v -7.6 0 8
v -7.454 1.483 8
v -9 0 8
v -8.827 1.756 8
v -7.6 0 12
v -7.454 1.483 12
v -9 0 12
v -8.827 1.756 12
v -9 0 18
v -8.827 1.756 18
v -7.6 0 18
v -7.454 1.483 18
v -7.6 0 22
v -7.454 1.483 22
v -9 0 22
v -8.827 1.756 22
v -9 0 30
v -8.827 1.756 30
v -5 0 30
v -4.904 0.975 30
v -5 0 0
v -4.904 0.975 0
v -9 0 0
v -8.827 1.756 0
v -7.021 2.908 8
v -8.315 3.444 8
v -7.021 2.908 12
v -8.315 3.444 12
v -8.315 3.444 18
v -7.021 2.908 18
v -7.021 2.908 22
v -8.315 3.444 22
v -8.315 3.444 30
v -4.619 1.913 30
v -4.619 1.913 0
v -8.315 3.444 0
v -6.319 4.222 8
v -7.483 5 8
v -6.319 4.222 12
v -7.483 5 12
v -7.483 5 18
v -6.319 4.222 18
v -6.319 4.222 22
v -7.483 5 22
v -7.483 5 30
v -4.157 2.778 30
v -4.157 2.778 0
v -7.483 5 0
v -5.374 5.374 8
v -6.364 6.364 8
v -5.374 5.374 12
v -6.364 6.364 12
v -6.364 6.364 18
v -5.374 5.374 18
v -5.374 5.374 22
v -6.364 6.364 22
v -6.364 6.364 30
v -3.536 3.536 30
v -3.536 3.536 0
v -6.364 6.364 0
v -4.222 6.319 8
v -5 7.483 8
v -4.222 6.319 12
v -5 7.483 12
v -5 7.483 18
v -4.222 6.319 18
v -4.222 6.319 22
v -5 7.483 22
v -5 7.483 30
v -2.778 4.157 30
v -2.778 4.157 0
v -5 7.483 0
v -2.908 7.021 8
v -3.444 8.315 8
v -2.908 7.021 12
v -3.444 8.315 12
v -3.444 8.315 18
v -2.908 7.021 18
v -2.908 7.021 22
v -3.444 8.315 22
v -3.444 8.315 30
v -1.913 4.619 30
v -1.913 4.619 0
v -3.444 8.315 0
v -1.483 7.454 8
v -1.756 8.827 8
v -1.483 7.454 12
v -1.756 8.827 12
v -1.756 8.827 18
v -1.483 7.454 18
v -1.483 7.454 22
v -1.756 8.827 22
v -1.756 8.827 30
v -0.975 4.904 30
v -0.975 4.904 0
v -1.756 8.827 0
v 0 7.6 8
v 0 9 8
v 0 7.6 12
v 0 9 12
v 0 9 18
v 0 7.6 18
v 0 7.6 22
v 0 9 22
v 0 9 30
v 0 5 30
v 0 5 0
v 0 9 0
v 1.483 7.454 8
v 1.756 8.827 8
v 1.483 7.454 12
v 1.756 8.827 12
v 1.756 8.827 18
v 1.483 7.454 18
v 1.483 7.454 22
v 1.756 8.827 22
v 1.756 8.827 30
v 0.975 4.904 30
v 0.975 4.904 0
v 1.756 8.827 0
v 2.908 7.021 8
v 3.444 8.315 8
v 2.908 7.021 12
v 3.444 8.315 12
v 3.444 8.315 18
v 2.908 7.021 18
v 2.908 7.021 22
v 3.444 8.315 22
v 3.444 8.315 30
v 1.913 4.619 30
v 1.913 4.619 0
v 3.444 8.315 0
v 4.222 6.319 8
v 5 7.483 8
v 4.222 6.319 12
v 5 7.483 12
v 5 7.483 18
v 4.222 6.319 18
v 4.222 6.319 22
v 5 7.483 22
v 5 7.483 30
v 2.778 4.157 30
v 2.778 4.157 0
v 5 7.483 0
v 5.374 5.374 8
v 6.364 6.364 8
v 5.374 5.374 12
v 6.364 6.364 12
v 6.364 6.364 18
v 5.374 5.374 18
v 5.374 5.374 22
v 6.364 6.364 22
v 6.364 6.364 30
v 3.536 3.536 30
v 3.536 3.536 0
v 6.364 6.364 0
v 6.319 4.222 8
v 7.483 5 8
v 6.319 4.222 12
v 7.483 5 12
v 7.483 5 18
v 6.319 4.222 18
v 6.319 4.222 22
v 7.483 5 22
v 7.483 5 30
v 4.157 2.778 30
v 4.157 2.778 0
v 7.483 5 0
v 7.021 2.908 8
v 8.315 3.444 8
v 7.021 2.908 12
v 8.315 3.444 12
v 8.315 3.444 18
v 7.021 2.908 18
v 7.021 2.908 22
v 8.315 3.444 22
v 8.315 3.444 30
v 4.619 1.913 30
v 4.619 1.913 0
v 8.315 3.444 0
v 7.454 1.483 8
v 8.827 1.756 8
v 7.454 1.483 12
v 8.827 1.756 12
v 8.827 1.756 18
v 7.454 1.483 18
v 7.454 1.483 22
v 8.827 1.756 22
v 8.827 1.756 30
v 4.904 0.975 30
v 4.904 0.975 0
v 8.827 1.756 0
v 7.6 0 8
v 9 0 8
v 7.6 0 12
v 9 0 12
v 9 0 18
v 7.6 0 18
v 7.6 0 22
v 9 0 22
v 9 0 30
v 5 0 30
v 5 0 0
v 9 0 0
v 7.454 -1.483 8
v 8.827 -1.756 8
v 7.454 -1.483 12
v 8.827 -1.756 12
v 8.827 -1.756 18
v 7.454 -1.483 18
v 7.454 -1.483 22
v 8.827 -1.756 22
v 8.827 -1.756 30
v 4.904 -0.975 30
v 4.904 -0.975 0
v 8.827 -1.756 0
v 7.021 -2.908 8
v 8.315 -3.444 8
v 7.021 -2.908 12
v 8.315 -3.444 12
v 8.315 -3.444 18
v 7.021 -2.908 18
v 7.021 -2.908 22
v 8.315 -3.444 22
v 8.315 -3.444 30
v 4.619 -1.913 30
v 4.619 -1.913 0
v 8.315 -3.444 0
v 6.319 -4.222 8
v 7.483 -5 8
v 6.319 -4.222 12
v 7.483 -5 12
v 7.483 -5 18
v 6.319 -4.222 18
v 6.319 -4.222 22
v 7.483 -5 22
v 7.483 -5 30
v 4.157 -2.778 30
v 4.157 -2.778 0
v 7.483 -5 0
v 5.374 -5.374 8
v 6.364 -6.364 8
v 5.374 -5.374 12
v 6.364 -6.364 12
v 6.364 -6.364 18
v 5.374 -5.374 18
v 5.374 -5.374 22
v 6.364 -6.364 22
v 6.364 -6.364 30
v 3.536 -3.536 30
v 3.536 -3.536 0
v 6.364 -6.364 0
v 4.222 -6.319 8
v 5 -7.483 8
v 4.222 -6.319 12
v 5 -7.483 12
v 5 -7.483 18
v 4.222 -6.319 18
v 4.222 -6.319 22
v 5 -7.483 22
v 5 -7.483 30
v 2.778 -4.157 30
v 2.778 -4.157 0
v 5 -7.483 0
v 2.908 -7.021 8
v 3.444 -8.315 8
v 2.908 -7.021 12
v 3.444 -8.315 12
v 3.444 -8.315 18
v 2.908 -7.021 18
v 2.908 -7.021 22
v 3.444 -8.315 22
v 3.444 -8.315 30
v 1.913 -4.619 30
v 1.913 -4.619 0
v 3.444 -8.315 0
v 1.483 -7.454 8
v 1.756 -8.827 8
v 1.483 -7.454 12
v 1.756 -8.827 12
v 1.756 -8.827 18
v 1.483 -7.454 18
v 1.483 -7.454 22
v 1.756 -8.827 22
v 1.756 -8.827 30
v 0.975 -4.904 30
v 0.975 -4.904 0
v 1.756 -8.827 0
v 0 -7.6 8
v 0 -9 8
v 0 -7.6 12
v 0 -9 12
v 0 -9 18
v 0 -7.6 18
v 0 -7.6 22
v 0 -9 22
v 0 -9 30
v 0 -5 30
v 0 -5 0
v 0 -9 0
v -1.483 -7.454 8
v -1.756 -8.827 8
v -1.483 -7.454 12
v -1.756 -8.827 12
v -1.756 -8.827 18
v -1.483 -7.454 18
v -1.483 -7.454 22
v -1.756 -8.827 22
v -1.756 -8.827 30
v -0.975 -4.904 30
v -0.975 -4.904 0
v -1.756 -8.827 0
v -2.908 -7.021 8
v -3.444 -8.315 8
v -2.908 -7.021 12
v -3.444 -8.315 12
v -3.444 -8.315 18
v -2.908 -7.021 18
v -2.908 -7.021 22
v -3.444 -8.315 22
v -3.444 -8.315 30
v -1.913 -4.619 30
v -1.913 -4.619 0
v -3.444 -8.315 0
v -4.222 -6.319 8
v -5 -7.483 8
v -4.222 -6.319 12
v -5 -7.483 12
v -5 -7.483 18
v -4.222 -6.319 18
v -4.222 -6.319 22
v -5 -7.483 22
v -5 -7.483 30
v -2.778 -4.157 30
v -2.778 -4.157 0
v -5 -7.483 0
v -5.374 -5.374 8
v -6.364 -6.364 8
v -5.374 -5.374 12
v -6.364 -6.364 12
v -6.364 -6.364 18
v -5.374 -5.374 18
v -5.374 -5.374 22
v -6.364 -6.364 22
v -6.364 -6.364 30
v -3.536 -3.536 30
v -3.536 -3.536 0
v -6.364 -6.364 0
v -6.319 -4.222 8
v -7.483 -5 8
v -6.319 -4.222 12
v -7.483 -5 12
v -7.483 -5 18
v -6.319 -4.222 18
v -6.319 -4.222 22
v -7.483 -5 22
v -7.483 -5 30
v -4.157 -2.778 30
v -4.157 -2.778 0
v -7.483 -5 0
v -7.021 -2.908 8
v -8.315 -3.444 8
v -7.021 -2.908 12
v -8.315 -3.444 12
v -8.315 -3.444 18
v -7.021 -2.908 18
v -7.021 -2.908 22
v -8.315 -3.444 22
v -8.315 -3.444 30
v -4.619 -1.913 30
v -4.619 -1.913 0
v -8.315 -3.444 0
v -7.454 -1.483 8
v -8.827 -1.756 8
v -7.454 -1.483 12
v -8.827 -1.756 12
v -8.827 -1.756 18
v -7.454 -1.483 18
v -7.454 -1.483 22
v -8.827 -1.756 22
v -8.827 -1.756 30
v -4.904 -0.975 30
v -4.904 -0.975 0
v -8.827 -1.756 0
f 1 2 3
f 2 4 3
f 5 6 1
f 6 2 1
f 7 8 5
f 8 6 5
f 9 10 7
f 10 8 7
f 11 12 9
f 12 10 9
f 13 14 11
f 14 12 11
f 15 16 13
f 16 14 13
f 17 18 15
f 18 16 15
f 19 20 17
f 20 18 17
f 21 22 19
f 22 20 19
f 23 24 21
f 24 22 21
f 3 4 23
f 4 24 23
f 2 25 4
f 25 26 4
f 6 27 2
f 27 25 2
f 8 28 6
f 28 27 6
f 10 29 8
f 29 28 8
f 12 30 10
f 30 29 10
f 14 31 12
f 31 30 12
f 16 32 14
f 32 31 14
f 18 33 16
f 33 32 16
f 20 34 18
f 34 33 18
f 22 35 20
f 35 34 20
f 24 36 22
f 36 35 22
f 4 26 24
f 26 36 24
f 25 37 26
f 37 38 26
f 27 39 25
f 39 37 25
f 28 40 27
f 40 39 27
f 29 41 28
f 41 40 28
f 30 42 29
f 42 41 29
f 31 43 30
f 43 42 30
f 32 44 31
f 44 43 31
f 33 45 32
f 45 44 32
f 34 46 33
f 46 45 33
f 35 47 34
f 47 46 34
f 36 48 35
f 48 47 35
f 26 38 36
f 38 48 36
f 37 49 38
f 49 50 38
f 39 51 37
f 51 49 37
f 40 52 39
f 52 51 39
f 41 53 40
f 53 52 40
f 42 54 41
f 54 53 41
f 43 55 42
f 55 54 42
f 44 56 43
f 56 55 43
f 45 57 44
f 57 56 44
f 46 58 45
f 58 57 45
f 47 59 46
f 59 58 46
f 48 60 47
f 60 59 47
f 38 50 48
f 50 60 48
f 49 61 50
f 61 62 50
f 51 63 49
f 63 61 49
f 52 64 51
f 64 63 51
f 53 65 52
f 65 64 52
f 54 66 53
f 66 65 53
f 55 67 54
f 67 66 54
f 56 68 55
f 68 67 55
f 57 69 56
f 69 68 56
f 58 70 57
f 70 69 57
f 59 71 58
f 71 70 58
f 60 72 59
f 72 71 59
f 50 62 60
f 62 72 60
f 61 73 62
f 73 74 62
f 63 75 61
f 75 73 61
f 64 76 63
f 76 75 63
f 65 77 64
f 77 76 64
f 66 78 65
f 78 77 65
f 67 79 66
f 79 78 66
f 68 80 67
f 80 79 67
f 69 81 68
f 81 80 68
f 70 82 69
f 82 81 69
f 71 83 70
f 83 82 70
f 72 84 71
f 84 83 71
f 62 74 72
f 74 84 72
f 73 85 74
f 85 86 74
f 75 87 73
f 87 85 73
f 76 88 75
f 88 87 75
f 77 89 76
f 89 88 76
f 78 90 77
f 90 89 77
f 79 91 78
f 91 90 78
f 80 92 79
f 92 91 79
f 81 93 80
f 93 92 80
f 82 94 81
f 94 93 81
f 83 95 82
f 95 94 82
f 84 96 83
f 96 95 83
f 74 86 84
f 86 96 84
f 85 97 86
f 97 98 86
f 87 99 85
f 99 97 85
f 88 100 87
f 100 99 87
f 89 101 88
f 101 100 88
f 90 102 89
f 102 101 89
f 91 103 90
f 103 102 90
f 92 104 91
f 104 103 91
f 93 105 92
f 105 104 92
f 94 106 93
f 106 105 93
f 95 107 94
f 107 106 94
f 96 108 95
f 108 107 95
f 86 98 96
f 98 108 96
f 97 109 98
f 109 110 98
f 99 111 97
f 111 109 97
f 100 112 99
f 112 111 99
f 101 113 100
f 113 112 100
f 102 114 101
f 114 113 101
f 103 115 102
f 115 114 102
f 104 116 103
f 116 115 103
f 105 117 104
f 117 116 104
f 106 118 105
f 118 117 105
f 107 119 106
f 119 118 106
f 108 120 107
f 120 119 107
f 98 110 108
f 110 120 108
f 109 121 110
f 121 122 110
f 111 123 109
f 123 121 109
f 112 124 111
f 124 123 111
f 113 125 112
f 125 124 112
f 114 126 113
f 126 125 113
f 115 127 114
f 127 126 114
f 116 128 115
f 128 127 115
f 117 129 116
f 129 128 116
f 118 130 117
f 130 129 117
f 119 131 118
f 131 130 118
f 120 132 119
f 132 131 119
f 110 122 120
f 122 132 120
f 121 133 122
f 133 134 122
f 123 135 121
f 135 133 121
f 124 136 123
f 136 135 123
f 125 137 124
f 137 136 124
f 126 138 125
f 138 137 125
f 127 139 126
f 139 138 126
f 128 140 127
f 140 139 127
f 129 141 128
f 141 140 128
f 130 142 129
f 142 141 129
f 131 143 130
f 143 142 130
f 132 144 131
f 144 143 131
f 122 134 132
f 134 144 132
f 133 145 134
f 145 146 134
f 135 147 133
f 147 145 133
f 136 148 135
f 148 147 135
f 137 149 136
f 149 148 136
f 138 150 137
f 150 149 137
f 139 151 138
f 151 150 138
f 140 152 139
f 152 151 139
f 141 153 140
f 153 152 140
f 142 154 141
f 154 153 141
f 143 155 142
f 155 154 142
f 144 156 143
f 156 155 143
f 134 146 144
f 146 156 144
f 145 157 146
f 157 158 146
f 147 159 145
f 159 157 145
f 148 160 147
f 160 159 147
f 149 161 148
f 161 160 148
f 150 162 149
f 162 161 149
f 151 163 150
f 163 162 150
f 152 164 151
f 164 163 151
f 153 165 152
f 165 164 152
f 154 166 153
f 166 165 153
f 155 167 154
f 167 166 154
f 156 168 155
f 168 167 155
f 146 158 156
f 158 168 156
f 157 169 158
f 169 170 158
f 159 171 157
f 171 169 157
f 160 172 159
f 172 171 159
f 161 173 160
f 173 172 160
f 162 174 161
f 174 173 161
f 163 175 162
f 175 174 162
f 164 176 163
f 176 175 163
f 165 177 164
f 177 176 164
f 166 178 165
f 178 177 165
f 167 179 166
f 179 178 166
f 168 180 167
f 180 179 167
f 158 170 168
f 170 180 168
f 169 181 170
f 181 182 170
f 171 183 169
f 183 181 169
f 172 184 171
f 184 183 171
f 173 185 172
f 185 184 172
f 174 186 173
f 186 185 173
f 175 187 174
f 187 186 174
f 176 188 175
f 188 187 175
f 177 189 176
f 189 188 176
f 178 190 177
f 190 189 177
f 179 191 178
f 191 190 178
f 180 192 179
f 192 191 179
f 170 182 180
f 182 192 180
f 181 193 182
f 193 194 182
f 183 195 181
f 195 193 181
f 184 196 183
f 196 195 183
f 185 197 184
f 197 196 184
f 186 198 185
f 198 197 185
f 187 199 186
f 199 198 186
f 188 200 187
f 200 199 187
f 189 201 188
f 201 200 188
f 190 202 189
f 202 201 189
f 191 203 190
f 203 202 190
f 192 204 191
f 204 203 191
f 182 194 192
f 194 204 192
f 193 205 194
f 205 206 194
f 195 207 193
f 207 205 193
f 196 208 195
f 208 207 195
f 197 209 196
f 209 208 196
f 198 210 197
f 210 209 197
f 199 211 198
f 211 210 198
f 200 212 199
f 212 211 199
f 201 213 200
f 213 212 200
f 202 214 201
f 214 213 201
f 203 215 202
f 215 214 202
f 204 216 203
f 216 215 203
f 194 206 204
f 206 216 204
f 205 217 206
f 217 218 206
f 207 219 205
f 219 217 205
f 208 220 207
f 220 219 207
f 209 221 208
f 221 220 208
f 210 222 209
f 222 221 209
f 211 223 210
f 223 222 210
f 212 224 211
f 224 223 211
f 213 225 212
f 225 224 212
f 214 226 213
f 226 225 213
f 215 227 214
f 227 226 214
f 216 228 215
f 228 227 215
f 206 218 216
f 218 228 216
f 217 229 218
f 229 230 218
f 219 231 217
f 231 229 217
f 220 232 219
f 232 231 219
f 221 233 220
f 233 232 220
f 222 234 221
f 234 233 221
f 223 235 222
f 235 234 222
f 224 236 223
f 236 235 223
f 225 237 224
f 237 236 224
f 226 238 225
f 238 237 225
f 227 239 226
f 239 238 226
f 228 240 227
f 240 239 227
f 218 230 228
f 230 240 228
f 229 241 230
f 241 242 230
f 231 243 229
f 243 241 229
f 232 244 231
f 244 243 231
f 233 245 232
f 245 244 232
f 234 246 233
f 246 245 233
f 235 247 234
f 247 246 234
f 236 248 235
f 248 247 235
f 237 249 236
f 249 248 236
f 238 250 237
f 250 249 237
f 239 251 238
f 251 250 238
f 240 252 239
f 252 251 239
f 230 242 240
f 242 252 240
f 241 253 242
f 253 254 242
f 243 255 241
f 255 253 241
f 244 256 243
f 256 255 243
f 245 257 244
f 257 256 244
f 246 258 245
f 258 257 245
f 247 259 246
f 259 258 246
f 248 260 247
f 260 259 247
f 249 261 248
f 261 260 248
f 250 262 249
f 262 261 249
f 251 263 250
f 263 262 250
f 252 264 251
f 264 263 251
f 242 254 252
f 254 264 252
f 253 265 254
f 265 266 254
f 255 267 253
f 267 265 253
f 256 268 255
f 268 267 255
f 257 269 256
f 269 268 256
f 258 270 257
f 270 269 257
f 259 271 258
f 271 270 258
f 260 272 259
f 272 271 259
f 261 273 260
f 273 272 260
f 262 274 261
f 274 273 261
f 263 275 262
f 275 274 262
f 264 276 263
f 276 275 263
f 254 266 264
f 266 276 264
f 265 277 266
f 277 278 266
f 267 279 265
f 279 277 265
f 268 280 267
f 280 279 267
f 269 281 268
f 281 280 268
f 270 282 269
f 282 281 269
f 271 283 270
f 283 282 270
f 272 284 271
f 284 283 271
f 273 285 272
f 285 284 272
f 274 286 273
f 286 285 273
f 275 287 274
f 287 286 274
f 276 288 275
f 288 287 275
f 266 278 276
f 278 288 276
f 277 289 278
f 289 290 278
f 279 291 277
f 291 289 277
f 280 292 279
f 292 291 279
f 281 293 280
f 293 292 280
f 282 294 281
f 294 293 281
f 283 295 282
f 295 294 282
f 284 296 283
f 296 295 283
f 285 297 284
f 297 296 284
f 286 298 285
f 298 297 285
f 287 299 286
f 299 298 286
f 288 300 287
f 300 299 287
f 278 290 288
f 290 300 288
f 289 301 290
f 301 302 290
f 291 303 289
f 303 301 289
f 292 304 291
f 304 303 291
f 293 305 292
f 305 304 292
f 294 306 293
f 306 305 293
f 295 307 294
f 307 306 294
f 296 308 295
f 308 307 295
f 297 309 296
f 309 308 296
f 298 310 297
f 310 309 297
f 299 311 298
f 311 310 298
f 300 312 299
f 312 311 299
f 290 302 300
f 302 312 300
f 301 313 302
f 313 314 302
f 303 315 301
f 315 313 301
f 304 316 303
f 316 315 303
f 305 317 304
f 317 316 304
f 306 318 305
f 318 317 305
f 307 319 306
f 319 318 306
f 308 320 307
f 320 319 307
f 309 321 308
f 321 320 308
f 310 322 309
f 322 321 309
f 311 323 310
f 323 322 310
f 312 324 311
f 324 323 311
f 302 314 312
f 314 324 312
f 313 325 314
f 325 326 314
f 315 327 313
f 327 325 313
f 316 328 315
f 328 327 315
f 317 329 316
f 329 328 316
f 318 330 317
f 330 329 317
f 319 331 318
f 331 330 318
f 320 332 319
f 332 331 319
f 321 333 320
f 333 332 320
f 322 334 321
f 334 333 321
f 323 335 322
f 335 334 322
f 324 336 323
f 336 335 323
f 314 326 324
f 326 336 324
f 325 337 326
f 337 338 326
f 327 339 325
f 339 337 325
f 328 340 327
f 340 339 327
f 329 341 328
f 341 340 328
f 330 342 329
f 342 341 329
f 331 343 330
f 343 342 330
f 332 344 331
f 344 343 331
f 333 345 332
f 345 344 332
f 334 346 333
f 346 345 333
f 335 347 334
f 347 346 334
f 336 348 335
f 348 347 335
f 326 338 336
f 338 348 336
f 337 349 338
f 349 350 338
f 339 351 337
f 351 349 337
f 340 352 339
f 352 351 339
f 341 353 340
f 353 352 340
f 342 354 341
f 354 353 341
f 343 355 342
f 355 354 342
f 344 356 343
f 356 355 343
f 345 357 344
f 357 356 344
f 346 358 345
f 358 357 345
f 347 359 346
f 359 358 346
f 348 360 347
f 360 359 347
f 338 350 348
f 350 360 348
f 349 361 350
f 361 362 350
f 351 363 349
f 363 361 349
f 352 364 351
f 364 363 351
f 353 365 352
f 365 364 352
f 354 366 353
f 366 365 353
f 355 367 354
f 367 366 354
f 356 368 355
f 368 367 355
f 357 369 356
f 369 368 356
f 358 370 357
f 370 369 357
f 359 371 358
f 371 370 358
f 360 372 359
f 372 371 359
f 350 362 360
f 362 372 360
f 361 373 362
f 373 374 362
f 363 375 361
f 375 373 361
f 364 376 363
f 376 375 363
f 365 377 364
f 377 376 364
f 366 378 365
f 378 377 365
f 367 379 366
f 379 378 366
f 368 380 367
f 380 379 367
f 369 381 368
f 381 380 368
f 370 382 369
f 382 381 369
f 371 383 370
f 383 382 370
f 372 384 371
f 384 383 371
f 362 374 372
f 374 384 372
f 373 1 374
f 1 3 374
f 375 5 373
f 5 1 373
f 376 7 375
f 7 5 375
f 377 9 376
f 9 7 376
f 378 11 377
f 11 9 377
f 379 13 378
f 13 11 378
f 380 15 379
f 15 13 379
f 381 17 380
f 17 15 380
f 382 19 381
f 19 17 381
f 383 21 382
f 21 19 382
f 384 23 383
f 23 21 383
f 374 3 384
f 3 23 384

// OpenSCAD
$fn = 32;

// ----------------------------------------------------------------------
// Grooved revolve: plain_grooves, bore R5
// ----------------------------------------------------------------------

// --- parameters (mm) ---
bore_r = 5;               // bore radius
outer_r = 9;              // outer radius of the body
total_h = 30;             // overall height, Z
wall = 4;                 // radial wall thickness
groove_w = 4;             // groove width
groove_d = 1.4;           // groove depth
grooves = 2;              // number of outer grooves

bbox_x = 2 * outer_r;  // full diameter
bore_d = 2 * bore_r;  // bore diameter
body_d = 2 * outer_r;  // body diameter
revolve_angle = 360;  // full turn around the Z axis

profile = [[5, 0], [9, 0], [9, 8], [7.6, 8], [7.6, 12], [9, 12], [9, 18], [7.6, 18], [7.6, 22], [9, 22], [9, 30], [5, 30]];  // primary outline, 12 points, counter clockwise

// --- the one profile operation ---
rotate_extrude(angle = revolve_angle) polygon(points = profile);
